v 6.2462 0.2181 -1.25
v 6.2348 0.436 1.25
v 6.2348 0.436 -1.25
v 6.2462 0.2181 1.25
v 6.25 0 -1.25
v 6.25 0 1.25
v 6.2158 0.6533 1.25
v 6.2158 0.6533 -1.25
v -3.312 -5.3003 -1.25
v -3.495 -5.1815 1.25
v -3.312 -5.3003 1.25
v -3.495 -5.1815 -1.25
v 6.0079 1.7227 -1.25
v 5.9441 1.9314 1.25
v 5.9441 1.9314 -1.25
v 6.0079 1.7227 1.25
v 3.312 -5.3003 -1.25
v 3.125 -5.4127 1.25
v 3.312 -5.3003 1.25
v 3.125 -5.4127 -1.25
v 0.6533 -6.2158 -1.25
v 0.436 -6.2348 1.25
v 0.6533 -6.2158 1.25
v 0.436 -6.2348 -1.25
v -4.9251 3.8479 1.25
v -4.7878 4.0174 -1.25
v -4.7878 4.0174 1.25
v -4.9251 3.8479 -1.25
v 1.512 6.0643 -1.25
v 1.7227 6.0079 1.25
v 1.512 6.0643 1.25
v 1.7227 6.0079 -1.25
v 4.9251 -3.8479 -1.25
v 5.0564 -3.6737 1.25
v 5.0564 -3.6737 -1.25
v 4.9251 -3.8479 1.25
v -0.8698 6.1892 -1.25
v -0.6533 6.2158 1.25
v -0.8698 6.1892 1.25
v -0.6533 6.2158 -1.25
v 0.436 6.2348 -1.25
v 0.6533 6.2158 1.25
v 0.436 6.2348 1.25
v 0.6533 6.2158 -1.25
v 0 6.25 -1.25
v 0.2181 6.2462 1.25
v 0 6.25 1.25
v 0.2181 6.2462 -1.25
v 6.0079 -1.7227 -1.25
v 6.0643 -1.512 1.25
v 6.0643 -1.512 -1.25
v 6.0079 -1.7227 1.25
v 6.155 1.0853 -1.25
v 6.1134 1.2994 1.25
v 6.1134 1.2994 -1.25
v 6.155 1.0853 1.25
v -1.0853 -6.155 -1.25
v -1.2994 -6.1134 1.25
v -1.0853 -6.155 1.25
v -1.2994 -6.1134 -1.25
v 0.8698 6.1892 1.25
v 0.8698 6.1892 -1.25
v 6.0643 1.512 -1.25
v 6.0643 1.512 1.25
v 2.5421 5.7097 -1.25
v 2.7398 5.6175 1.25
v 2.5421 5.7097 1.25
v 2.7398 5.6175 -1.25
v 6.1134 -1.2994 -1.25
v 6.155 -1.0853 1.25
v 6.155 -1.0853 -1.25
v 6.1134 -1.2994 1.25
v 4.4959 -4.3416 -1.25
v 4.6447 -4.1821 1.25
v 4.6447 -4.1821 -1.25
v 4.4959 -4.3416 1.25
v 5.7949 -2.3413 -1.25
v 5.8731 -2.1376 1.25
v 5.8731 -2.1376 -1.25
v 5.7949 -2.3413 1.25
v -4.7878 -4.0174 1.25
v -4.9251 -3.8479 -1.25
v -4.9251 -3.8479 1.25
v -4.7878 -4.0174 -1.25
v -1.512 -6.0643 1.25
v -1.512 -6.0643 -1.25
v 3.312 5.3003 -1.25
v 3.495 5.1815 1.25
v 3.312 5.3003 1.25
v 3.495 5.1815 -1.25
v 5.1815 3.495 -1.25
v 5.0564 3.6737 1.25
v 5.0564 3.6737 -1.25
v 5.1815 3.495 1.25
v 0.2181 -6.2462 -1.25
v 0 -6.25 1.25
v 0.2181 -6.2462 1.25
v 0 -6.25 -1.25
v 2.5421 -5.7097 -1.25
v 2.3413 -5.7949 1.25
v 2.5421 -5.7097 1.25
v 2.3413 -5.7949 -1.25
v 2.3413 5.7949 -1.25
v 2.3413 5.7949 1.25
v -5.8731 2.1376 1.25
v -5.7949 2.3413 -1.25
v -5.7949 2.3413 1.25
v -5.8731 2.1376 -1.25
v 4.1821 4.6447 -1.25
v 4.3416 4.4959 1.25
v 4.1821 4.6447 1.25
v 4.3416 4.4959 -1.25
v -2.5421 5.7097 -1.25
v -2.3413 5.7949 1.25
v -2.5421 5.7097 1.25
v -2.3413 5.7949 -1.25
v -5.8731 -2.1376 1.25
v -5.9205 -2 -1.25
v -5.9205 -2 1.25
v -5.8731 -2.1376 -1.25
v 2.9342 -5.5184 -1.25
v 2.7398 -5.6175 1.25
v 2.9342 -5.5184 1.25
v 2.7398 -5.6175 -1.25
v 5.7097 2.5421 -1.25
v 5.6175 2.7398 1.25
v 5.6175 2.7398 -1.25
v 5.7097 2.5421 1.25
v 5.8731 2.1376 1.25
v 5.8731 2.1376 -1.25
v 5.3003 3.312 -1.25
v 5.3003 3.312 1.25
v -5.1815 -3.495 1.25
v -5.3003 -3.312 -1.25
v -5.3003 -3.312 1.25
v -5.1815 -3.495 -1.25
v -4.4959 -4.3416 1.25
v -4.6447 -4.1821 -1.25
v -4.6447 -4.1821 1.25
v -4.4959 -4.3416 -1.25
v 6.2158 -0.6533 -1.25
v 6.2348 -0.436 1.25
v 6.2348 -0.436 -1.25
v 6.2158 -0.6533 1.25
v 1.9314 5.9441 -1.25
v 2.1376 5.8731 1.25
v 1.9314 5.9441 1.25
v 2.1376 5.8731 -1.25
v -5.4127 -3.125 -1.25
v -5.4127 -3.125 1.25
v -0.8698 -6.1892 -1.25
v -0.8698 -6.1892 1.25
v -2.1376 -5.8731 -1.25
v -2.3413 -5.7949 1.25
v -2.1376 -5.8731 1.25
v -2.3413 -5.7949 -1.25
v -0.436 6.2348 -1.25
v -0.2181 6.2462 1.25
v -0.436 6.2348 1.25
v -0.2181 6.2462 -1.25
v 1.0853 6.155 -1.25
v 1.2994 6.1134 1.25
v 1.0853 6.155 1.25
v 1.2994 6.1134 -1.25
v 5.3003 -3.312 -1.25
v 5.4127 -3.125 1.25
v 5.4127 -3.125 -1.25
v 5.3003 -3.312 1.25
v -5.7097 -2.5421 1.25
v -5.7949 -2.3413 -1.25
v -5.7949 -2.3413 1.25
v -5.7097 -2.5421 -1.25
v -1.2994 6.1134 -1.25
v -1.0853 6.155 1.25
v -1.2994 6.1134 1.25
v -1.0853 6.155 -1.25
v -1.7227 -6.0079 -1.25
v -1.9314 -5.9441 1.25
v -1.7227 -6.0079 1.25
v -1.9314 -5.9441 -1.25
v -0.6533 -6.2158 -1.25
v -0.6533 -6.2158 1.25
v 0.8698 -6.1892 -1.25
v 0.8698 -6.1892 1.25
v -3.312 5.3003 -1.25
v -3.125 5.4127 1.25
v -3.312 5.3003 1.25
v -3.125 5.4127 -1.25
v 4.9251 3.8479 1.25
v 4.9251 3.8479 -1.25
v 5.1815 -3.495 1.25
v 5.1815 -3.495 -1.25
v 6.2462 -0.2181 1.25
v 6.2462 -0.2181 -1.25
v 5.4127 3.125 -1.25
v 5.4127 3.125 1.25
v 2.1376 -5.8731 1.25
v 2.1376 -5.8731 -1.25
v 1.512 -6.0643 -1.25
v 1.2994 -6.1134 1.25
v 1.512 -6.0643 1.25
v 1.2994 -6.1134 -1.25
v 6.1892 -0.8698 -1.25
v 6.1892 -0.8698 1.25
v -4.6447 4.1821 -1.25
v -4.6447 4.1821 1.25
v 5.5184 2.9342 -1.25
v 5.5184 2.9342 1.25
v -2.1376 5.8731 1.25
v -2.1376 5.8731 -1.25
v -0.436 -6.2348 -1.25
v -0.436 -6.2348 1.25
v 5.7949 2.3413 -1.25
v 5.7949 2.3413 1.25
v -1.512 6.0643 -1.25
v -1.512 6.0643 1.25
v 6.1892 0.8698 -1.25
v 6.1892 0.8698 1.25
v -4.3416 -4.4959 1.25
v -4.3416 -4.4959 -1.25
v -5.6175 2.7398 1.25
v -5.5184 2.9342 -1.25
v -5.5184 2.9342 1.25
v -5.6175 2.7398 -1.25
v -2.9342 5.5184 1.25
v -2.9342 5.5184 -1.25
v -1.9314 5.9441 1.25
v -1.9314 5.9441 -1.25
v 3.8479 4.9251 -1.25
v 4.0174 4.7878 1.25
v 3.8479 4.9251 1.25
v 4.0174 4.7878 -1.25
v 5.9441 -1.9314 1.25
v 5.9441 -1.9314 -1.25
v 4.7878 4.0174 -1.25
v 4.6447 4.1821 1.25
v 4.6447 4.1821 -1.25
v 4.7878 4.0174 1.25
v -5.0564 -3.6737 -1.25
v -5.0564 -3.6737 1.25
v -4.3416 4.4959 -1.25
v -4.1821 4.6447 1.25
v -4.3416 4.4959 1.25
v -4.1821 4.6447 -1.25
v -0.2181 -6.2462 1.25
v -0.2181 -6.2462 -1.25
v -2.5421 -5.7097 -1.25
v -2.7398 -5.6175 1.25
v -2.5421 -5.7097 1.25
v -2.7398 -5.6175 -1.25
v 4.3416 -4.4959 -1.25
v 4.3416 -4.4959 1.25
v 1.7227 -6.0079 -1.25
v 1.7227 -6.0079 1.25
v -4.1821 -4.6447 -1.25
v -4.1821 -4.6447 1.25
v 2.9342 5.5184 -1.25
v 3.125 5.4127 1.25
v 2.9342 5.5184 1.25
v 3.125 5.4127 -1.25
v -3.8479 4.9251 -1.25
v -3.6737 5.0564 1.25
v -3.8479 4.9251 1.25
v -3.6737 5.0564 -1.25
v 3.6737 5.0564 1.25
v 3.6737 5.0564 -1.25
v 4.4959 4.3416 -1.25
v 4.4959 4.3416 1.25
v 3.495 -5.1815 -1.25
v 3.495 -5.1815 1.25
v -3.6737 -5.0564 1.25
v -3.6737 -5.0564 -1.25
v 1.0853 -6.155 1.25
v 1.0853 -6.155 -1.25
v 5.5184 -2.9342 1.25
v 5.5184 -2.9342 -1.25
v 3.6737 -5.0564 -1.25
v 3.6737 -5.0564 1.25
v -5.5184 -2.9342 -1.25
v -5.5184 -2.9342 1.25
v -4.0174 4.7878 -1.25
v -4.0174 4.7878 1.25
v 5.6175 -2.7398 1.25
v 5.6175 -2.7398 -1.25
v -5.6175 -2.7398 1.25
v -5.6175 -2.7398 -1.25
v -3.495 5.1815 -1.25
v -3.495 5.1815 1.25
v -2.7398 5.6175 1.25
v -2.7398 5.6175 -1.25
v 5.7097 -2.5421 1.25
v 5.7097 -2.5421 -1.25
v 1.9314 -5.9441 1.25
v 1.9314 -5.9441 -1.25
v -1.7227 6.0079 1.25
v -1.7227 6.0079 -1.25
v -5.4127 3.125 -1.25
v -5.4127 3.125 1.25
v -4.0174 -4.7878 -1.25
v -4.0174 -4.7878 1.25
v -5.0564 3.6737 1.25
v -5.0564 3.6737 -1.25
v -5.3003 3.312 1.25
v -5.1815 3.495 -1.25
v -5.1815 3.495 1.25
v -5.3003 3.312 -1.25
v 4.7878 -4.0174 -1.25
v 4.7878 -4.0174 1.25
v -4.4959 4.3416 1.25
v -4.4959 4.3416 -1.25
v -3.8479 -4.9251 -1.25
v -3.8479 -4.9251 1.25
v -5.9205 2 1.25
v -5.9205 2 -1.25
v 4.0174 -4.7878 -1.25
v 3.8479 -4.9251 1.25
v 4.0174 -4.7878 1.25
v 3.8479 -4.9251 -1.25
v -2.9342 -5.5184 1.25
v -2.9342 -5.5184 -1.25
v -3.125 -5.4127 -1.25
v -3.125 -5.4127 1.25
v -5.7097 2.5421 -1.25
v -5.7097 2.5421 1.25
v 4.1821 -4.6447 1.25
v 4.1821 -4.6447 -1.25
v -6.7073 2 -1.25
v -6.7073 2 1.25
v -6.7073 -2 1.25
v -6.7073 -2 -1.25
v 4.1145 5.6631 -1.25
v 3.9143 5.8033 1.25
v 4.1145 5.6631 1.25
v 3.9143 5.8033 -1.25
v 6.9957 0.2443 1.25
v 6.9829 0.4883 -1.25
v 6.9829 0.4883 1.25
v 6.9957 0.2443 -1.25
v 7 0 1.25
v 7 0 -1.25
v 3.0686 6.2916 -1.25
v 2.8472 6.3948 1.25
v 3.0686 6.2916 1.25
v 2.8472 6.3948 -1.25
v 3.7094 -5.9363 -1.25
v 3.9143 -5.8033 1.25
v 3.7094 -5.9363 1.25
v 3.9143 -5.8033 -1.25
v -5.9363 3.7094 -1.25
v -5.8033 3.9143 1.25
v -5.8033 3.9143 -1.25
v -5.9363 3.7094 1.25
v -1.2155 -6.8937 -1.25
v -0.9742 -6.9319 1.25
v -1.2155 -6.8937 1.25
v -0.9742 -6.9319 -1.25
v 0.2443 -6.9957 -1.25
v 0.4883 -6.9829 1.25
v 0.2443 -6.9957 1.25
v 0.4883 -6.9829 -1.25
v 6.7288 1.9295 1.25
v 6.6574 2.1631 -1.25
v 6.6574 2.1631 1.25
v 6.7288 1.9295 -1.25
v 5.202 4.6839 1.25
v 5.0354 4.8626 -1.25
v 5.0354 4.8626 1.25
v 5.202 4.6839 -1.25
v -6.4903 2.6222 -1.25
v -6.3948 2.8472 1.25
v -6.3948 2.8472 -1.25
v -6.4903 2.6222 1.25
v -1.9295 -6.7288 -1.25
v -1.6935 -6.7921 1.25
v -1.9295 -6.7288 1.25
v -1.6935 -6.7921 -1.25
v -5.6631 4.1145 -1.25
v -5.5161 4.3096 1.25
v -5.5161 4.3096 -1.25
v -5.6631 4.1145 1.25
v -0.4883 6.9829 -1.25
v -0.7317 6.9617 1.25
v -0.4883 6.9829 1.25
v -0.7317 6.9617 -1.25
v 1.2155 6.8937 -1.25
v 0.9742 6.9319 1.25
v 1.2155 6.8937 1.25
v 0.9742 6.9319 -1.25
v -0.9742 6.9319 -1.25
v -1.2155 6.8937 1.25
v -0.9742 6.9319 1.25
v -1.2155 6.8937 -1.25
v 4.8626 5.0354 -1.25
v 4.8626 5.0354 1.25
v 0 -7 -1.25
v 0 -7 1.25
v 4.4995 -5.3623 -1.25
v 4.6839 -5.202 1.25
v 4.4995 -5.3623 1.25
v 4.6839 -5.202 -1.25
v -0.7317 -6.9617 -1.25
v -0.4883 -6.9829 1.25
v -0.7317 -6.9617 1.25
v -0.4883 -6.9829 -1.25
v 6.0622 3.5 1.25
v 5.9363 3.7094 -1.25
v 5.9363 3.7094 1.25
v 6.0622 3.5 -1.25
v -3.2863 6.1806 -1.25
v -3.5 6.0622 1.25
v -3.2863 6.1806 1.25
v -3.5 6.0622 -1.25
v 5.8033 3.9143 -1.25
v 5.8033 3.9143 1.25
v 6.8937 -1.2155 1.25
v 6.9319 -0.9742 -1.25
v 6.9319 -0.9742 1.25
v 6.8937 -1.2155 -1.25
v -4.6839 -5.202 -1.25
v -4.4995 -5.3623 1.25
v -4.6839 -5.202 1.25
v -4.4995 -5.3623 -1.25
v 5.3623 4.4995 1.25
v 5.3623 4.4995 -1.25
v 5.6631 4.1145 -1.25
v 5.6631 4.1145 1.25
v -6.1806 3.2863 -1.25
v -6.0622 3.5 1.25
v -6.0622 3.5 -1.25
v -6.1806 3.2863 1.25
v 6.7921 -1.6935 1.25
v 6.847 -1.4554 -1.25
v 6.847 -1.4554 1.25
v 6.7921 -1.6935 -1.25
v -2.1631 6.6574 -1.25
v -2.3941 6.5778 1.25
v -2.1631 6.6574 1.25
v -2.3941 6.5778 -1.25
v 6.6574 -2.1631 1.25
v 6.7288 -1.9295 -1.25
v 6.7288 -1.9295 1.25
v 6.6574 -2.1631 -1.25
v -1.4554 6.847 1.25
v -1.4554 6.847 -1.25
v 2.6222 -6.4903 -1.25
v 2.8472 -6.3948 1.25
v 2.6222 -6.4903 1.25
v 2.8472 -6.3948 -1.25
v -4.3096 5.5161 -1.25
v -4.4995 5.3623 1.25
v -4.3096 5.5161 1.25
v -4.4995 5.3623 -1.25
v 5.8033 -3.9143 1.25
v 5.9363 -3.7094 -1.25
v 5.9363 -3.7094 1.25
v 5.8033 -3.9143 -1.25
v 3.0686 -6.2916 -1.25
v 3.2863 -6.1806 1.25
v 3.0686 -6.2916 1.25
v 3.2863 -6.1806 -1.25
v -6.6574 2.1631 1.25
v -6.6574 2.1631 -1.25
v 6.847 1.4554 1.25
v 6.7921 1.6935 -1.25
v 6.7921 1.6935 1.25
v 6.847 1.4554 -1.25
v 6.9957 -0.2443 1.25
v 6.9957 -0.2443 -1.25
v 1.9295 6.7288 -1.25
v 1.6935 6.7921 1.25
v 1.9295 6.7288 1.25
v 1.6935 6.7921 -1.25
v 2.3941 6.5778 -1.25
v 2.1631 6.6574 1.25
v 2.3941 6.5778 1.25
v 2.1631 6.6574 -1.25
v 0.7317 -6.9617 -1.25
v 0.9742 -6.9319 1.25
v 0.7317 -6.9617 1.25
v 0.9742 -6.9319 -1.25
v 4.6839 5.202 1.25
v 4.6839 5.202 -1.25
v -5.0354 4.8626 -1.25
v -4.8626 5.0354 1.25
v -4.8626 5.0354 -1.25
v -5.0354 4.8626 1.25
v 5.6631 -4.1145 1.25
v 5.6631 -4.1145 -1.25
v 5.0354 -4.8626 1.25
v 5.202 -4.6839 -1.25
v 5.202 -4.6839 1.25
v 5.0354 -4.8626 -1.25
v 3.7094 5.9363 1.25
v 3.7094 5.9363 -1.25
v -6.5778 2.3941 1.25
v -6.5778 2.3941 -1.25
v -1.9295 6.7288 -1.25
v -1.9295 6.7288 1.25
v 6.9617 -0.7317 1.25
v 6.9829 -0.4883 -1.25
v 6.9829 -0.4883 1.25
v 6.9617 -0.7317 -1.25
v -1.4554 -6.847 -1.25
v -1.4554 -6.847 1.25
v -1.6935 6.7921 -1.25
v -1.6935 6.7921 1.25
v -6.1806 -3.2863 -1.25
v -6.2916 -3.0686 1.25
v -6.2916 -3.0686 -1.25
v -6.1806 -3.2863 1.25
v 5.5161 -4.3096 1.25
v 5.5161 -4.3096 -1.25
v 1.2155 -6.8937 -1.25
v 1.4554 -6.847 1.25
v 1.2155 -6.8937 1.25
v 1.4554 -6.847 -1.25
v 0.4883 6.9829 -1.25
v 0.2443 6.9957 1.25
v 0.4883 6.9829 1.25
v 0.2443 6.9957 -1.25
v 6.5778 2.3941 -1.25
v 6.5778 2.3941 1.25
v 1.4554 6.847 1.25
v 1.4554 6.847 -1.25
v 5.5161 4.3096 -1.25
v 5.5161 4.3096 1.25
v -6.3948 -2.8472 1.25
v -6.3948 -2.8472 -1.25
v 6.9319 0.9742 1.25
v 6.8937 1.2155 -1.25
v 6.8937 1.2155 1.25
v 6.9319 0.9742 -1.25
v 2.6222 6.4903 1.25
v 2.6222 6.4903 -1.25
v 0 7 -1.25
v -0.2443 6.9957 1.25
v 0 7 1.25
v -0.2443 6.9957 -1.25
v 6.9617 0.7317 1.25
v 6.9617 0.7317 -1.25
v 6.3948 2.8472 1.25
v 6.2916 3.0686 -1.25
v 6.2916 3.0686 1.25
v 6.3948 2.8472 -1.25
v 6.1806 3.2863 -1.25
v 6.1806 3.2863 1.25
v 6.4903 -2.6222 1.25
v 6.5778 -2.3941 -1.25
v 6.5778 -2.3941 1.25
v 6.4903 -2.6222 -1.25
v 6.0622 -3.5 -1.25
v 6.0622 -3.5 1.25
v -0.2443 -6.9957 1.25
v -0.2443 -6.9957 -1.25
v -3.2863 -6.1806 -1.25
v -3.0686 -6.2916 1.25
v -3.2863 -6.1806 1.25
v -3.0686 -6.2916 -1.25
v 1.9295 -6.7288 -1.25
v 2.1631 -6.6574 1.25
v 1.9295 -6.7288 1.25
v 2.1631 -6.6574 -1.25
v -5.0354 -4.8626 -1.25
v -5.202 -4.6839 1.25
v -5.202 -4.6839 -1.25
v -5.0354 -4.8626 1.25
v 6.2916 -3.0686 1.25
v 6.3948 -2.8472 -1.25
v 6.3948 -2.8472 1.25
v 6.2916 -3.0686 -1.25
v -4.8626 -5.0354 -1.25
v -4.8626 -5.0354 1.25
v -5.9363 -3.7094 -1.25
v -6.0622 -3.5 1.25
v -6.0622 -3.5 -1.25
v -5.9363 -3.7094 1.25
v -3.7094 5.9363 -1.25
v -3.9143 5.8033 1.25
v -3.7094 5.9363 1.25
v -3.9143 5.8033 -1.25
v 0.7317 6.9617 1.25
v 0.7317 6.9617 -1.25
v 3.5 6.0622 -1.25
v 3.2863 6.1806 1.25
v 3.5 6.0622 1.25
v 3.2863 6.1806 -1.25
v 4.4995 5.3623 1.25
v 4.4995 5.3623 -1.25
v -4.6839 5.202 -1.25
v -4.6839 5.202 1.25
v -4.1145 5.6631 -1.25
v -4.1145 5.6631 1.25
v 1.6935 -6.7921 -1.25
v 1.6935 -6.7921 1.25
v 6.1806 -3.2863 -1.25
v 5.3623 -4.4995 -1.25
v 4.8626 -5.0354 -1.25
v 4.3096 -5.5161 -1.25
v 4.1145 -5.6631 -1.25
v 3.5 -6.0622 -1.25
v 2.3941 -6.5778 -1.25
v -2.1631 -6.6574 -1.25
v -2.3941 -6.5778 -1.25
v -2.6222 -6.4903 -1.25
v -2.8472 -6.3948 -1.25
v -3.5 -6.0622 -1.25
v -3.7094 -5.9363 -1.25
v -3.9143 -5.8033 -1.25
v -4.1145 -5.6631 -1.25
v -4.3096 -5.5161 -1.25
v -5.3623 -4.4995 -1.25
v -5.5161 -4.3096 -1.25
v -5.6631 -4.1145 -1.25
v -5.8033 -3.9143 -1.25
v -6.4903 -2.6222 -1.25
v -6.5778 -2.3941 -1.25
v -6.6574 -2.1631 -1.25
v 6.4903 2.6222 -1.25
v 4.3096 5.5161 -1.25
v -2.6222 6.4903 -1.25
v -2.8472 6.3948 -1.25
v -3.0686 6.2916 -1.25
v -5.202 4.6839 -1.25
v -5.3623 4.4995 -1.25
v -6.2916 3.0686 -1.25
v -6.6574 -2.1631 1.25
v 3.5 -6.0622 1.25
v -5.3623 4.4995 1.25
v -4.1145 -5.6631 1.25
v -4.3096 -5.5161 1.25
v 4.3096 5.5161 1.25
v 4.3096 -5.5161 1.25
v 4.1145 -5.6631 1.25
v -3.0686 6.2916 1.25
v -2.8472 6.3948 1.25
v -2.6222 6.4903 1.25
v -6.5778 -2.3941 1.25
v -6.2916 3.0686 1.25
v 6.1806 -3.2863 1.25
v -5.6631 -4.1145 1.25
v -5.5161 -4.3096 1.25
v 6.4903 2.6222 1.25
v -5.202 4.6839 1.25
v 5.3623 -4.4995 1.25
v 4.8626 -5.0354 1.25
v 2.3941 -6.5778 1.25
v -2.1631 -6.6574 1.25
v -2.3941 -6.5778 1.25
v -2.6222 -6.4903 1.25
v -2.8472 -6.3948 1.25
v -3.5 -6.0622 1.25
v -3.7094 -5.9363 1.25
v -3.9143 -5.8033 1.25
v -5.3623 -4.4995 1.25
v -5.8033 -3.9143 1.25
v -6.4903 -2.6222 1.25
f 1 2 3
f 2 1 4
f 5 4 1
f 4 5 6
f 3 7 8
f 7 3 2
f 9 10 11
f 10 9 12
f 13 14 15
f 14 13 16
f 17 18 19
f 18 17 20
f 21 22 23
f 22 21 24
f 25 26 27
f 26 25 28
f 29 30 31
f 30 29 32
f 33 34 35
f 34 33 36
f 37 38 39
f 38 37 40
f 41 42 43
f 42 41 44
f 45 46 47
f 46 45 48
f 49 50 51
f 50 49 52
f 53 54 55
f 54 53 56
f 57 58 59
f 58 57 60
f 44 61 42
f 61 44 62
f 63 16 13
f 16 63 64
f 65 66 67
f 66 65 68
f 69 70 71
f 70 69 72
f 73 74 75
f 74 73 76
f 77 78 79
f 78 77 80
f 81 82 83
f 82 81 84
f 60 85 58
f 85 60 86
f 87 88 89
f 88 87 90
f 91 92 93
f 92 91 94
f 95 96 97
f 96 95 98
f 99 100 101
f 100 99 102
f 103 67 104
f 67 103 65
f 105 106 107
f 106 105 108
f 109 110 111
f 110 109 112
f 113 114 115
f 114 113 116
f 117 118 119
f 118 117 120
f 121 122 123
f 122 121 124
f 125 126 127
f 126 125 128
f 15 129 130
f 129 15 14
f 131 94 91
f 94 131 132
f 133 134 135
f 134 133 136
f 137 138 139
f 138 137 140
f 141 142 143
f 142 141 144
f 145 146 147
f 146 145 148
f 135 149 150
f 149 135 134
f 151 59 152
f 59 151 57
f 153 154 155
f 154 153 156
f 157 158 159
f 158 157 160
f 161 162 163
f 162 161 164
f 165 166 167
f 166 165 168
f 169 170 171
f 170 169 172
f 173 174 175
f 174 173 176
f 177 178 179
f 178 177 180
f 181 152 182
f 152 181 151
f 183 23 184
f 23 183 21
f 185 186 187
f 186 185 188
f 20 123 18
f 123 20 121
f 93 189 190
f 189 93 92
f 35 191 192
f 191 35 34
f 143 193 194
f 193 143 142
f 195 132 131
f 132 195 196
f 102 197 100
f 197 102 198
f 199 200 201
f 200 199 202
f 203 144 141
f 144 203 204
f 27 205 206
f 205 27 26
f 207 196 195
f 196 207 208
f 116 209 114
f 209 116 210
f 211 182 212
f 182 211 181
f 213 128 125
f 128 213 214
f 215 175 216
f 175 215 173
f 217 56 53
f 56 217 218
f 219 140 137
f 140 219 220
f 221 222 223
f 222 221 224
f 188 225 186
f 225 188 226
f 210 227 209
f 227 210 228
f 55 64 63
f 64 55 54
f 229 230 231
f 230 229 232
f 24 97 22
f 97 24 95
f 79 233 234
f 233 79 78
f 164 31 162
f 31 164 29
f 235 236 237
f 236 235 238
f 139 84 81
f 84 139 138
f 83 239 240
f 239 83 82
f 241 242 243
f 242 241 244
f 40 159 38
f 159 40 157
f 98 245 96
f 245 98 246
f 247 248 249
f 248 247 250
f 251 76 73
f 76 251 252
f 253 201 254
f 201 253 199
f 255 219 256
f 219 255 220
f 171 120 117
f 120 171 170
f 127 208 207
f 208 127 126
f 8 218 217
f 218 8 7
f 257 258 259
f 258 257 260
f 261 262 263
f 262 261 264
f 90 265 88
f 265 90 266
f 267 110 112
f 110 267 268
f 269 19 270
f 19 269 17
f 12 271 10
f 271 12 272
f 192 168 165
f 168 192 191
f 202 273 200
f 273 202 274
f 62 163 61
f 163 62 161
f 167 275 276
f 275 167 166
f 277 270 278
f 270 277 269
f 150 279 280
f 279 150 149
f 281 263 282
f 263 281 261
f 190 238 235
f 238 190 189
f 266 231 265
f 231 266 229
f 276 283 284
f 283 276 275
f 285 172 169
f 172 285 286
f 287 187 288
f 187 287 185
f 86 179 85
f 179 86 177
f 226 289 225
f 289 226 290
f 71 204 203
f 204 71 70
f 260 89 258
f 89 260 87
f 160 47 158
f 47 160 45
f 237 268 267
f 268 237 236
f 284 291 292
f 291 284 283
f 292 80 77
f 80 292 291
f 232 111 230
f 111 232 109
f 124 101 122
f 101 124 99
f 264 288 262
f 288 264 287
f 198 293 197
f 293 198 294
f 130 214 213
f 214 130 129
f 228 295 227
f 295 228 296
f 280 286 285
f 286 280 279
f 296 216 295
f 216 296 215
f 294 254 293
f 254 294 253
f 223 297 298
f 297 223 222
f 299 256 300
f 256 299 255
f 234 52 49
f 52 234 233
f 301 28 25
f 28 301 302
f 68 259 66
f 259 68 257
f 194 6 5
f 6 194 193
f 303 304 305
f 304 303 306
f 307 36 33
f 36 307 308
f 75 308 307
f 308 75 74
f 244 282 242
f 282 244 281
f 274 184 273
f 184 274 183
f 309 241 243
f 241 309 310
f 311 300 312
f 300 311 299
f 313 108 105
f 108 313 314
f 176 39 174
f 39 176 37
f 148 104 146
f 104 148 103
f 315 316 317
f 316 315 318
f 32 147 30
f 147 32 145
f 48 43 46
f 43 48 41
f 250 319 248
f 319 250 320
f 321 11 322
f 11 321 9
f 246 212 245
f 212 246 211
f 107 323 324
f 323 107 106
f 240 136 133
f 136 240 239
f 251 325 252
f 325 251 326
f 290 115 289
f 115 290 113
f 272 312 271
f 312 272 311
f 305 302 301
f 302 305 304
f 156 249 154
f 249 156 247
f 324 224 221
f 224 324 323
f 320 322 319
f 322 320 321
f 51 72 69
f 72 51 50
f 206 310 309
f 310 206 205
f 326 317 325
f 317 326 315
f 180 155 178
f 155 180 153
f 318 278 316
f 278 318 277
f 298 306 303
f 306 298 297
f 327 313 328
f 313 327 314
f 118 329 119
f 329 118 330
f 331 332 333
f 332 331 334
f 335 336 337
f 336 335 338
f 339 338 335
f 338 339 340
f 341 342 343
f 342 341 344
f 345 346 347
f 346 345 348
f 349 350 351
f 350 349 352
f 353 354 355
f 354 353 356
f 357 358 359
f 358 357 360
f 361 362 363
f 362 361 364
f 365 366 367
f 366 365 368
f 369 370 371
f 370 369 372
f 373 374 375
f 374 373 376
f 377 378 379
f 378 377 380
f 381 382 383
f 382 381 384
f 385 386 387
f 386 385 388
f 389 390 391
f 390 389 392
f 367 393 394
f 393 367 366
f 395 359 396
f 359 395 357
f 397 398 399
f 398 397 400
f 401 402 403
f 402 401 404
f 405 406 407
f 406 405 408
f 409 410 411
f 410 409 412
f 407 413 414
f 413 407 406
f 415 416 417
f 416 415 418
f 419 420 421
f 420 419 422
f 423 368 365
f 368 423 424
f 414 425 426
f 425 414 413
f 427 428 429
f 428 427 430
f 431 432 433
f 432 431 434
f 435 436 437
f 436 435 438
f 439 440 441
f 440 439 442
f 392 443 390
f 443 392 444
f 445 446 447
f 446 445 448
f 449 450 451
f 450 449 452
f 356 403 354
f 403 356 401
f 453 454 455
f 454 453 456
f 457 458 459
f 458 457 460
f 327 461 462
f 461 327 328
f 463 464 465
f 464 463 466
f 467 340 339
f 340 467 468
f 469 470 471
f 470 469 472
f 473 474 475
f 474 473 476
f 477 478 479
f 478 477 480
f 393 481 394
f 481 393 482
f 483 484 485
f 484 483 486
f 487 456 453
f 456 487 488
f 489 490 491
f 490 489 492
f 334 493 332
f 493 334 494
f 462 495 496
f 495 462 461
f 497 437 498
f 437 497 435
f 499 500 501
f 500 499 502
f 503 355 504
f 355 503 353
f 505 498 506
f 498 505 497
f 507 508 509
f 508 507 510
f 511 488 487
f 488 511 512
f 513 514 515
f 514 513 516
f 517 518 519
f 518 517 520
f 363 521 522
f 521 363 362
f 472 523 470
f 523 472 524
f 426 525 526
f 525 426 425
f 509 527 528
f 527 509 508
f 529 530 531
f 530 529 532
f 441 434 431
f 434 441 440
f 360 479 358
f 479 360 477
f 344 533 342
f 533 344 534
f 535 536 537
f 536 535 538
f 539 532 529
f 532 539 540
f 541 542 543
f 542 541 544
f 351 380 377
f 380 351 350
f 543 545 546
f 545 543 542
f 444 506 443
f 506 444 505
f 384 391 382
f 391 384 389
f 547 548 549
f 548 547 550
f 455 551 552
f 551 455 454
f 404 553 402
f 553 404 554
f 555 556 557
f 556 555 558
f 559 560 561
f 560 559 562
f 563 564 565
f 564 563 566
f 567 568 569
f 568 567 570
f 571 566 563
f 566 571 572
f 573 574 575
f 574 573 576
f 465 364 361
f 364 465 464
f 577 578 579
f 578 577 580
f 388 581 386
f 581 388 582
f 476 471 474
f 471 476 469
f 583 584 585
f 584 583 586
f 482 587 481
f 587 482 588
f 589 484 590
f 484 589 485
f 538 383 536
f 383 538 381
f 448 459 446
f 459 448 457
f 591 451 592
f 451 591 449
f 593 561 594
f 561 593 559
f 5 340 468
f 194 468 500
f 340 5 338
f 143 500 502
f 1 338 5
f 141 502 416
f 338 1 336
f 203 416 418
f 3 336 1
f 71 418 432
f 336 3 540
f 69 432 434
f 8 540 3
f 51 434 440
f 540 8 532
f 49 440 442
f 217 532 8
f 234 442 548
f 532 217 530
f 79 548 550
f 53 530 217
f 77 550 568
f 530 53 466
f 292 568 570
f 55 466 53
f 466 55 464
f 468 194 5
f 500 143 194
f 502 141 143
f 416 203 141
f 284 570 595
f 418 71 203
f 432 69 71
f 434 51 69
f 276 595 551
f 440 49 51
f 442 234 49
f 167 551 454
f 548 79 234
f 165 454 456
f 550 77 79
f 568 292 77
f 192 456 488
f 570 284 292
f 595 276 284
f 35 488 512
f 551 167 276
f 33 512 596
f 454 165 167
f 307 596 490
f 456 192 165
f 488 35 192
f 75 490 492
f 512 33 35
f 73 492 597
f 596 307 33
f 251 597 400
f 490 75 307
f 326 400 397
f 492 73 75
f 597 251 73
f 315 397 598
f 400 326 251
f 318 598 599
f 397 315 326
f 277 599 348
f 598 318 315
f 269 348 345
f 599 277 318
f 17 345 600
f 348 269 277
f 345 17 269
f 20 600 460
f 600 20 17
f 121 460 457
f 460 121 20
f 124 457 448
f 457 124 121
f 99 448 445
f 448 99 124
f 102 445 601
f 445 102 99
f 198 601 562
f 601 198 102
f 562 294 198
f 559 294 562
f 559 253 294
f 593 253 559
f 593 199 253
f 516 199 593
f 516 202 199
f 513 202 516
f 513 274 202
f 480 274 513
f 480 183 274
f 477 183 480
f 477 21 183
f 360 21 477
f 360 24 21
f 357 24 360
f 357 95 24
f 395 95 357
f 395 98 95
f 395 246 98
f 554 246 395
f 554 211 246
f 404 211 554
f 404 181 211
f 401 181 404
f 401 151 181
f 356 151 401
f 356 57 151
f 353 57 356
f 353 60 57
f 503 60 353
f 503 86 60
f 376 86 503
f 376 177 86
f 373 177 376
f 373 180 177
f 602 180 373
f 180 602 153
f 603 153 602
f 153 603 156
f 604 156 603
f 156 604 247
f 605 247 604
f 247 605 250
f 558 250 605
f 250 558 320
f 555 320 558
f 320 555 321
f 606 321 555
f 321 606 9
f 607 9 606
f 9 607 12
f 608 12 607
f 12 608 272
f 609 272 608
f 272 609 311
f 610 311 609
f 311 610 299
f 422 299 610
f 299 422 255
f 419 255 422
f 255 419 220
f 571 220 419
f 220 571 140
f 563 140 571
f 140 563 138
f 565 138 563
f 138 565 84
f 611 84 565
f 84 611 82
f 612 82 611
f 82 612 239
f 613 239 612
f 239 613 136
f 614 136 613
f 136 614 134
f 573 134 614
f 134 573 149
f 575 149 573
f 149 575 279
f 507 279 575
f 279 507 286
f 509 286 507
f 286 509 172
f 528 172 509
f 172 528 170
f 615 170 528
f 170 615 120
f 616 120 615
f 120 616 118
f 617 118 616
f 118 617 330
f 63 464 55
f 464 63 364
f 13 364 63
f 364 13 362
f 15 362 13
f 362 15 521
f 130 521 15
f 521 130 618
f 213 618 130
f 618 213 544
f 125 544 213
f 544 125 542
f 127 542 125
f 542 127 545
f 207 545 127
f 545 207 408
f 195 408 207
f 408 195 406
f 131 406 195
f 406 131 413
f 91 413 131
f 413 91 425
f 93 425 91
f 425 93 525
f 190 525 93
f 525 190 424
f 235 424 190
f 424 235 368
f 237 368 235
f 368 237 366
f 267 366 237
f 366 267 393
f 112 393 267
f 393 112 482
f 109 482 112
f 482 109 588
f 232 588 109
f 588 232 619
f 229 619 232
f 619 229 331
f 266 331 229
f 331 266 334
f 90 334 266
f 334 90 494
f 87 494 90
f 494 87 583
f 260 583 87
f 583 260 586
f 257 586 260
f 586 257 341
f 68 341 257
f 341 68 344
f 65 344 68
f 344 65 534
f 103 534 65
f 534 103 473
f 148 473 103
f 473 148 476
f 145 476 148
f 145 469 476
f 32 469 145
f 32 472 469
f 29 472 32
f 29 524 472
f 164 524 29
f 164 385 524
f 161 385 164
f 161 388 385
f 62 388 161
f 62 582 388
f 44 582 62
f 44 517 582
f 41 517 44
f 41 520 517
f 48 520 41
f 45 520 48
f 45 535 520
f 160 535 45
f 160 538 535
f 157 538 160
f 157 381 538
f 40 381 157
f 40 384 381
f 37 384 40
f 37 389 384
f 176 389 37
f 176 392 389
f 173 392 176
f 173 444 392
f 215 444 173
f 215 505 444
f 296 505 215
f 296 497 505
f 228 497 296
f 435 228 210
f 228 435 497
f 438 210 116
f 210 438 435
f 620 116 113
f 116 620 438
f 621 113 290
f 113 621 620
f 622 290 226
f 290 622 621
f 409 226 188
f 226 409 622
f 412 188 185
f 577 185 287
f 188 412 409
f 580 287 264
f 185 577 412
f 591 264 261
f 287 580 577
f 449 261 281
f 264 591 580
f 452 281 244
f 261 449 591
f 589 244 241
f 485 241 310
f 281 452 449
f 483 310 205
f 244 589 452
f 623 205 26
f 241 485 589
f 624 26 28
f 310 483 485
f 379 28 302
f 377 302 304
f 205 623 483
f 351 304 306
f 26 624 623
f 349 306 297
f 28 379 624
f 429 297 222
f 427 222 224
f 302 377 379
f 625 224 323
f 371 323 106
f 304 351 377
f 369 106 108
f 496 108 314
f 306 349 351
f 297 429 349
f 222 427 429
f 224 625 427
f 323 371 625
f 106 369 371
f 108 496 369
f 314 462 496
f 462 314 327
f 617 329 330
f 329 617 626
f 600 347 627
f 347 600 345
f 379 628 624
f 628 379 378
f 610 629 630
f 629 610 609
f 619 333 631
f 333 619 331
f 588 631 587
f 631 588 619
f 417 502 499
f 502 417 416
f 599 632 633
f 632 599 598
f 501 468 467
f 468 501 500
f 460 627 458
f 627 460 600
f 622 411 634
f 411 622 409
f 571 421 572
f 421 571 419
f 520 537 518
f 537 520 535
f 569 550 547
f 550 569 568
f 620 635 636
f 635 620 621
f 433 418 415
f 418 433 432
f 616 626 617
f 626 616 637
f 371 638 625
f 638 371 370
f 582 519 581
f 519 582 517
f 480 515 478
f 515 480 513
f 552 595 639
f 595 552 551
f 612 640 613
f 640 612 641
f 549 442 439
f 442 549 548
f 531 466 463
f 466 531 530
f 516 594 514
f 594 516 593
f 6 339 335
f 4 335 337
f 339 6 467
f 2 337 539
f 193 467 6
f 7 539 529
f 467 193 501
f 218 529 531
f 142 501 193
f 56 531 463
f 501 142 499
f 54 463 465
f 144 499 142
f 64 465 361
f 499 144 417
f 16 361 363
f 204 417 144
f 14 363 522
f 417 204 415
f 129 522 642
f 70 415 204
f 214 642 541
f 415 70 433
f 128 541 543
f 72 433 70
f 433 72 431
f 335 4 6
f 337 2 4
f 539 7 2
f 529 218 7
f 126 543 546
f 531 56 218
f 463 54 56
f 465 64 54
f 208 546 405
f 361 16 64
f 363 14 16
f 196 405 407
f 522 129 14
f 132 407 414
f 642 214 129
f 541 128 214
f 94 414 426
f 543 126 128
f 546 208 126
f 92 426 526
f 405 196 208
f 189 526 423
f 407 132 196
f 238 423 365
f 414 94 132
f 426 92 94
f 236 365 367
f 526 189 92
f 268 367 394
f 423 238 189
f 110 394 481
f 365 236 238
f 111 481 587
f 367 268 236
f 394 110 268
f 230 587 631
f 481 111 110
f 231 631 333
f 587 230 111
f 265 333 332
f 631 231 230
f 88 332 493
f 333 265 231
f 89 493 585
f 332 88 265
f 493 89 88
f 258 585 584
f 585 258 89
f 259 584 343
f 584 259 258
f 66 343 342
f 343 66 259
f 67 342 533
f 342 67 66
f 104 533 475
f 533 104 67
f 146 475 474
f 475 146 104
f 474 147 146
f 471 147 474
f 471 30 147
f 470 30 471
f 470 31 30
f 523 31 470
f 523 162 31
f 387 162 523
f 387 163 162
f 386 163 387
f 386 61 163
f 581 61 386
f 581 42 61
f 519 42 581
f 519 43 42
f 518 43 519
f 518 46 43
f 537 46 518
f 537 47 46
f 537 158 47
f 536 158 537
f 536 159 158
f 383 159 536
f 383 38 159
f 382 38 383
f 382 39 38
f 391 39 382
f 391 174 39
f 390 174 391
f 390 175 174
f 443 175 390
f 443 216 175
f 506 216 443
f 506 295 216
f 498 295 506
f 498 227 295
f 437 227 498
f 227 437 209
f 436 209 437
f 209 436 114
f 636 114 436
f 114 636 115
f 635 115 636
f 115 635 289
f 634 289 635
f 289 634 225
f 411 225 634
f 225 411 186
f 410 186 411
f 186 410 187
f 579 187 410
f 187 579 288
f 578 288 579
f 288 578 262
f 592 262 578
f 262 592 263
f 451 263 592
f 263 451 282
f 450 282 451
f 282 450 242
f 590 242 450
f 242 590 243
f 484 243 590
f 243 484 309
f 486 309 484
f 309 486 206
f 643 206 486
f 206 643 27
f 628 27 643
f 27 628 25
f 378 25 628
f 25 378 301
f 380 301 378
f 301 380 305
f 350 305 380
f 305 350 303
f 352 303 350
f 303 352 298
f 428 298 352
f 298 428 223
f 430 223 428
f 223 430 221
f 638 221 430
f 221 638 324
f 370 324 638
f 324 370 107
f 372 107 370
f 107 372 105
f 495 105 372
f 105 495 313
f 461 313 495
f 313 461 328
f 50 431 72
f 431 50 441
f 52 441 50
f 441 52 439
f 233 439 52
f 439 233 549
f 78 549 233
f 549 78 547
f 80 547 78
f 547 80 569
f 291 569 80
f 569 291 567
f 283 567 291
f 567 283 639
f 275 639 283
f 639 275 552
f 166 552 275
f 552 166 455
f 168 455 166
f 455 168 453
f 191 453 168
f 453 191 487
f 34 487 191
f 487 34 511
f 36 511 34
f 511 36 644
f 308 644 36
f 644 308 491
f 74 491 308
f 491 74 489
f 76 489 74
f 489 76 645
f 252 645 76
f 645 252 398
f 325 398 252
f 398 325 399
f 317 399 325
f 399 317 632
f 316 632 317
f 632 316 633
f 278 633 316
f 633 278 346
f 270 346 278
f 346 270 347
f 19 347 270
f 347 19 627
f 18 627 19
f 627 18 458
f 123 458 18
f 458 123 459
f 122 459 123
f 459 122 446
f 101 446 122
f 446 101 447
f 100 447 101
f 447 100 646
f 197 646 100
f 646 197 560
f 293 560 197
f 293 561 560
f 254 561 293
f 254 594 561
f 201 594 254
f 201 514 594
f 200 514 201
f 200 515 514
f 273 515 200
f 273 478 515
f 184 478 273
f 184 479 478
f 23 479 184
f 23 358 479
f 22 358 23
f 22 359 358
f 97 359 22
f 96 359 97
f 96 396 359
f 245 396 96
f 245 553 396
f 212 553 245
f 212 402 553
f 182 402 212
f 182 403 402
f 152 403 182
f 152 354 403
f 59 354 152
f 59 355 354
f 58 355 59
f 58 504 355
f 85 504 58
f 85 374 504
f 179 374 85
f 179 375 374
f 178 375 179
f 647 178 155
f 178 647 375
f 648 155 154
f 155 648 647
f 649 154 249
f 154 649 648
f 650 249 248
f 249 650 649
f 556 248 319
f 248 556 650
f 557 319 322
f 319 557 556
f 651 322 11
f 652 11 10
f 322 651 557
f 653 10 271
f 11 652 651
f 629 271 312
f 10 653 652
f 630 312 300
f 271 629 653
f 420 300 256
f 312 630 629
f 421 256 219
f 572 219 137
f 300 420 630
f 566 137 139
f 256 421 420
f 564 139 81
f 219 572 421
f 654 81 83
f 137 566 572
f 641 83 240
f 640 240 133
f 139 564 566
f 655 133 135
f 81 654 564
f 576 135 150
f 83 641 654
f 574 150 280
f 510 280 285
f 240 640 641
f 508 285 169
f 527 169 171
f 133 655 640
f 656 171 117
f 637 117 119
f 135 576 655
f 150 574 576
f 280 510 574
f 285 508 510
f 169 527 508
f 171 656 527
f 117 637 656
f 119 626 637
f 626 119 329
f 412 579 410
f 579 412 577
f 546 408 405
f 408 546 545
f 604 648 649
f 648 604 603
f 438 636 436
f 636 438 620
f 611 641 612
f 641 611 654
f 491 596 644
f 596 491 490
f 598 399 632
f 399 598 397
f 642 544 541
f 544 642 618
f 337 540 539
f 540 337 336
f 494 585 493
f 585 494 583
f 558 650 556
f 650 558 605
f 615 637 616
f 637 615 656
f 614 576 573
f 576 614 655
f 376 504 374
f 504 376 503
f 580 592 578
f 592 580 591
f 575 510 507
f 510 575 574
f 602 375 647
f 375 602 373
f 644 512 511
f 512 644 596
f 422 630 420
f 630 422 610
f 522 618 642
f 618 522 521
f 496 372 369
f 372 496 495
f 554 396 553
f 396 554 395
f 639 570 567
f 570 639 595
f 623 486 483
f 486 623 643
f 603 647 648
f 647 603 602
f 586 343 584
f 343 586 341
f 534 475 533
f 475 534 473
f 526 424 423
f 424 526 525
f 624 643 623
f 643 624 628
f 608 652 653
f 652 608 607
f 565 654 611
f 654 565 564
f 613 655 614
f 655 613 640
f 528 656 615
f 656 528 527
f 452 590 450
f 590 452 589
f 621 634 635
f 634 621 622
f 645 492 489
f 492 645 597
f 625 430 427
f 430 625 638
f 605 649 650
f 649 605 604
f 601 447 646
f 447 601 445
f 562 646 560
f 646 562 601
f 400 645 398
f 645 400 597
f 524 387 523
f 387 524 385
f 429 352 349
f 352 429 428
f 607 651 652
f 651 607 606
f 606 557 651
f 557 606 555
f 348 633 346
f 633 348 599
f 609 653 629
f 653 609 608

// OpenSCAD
difference() {
    union() {
        cylinder(r=7, h=2.5, $fn=180, center=true);
    }
    union() {
        cylinder(r=6.25, h=3.0, $fn=180, center=true);
        translate([-6, 0, 0]) cube([4, 4, 4], center=true);
    }
}
